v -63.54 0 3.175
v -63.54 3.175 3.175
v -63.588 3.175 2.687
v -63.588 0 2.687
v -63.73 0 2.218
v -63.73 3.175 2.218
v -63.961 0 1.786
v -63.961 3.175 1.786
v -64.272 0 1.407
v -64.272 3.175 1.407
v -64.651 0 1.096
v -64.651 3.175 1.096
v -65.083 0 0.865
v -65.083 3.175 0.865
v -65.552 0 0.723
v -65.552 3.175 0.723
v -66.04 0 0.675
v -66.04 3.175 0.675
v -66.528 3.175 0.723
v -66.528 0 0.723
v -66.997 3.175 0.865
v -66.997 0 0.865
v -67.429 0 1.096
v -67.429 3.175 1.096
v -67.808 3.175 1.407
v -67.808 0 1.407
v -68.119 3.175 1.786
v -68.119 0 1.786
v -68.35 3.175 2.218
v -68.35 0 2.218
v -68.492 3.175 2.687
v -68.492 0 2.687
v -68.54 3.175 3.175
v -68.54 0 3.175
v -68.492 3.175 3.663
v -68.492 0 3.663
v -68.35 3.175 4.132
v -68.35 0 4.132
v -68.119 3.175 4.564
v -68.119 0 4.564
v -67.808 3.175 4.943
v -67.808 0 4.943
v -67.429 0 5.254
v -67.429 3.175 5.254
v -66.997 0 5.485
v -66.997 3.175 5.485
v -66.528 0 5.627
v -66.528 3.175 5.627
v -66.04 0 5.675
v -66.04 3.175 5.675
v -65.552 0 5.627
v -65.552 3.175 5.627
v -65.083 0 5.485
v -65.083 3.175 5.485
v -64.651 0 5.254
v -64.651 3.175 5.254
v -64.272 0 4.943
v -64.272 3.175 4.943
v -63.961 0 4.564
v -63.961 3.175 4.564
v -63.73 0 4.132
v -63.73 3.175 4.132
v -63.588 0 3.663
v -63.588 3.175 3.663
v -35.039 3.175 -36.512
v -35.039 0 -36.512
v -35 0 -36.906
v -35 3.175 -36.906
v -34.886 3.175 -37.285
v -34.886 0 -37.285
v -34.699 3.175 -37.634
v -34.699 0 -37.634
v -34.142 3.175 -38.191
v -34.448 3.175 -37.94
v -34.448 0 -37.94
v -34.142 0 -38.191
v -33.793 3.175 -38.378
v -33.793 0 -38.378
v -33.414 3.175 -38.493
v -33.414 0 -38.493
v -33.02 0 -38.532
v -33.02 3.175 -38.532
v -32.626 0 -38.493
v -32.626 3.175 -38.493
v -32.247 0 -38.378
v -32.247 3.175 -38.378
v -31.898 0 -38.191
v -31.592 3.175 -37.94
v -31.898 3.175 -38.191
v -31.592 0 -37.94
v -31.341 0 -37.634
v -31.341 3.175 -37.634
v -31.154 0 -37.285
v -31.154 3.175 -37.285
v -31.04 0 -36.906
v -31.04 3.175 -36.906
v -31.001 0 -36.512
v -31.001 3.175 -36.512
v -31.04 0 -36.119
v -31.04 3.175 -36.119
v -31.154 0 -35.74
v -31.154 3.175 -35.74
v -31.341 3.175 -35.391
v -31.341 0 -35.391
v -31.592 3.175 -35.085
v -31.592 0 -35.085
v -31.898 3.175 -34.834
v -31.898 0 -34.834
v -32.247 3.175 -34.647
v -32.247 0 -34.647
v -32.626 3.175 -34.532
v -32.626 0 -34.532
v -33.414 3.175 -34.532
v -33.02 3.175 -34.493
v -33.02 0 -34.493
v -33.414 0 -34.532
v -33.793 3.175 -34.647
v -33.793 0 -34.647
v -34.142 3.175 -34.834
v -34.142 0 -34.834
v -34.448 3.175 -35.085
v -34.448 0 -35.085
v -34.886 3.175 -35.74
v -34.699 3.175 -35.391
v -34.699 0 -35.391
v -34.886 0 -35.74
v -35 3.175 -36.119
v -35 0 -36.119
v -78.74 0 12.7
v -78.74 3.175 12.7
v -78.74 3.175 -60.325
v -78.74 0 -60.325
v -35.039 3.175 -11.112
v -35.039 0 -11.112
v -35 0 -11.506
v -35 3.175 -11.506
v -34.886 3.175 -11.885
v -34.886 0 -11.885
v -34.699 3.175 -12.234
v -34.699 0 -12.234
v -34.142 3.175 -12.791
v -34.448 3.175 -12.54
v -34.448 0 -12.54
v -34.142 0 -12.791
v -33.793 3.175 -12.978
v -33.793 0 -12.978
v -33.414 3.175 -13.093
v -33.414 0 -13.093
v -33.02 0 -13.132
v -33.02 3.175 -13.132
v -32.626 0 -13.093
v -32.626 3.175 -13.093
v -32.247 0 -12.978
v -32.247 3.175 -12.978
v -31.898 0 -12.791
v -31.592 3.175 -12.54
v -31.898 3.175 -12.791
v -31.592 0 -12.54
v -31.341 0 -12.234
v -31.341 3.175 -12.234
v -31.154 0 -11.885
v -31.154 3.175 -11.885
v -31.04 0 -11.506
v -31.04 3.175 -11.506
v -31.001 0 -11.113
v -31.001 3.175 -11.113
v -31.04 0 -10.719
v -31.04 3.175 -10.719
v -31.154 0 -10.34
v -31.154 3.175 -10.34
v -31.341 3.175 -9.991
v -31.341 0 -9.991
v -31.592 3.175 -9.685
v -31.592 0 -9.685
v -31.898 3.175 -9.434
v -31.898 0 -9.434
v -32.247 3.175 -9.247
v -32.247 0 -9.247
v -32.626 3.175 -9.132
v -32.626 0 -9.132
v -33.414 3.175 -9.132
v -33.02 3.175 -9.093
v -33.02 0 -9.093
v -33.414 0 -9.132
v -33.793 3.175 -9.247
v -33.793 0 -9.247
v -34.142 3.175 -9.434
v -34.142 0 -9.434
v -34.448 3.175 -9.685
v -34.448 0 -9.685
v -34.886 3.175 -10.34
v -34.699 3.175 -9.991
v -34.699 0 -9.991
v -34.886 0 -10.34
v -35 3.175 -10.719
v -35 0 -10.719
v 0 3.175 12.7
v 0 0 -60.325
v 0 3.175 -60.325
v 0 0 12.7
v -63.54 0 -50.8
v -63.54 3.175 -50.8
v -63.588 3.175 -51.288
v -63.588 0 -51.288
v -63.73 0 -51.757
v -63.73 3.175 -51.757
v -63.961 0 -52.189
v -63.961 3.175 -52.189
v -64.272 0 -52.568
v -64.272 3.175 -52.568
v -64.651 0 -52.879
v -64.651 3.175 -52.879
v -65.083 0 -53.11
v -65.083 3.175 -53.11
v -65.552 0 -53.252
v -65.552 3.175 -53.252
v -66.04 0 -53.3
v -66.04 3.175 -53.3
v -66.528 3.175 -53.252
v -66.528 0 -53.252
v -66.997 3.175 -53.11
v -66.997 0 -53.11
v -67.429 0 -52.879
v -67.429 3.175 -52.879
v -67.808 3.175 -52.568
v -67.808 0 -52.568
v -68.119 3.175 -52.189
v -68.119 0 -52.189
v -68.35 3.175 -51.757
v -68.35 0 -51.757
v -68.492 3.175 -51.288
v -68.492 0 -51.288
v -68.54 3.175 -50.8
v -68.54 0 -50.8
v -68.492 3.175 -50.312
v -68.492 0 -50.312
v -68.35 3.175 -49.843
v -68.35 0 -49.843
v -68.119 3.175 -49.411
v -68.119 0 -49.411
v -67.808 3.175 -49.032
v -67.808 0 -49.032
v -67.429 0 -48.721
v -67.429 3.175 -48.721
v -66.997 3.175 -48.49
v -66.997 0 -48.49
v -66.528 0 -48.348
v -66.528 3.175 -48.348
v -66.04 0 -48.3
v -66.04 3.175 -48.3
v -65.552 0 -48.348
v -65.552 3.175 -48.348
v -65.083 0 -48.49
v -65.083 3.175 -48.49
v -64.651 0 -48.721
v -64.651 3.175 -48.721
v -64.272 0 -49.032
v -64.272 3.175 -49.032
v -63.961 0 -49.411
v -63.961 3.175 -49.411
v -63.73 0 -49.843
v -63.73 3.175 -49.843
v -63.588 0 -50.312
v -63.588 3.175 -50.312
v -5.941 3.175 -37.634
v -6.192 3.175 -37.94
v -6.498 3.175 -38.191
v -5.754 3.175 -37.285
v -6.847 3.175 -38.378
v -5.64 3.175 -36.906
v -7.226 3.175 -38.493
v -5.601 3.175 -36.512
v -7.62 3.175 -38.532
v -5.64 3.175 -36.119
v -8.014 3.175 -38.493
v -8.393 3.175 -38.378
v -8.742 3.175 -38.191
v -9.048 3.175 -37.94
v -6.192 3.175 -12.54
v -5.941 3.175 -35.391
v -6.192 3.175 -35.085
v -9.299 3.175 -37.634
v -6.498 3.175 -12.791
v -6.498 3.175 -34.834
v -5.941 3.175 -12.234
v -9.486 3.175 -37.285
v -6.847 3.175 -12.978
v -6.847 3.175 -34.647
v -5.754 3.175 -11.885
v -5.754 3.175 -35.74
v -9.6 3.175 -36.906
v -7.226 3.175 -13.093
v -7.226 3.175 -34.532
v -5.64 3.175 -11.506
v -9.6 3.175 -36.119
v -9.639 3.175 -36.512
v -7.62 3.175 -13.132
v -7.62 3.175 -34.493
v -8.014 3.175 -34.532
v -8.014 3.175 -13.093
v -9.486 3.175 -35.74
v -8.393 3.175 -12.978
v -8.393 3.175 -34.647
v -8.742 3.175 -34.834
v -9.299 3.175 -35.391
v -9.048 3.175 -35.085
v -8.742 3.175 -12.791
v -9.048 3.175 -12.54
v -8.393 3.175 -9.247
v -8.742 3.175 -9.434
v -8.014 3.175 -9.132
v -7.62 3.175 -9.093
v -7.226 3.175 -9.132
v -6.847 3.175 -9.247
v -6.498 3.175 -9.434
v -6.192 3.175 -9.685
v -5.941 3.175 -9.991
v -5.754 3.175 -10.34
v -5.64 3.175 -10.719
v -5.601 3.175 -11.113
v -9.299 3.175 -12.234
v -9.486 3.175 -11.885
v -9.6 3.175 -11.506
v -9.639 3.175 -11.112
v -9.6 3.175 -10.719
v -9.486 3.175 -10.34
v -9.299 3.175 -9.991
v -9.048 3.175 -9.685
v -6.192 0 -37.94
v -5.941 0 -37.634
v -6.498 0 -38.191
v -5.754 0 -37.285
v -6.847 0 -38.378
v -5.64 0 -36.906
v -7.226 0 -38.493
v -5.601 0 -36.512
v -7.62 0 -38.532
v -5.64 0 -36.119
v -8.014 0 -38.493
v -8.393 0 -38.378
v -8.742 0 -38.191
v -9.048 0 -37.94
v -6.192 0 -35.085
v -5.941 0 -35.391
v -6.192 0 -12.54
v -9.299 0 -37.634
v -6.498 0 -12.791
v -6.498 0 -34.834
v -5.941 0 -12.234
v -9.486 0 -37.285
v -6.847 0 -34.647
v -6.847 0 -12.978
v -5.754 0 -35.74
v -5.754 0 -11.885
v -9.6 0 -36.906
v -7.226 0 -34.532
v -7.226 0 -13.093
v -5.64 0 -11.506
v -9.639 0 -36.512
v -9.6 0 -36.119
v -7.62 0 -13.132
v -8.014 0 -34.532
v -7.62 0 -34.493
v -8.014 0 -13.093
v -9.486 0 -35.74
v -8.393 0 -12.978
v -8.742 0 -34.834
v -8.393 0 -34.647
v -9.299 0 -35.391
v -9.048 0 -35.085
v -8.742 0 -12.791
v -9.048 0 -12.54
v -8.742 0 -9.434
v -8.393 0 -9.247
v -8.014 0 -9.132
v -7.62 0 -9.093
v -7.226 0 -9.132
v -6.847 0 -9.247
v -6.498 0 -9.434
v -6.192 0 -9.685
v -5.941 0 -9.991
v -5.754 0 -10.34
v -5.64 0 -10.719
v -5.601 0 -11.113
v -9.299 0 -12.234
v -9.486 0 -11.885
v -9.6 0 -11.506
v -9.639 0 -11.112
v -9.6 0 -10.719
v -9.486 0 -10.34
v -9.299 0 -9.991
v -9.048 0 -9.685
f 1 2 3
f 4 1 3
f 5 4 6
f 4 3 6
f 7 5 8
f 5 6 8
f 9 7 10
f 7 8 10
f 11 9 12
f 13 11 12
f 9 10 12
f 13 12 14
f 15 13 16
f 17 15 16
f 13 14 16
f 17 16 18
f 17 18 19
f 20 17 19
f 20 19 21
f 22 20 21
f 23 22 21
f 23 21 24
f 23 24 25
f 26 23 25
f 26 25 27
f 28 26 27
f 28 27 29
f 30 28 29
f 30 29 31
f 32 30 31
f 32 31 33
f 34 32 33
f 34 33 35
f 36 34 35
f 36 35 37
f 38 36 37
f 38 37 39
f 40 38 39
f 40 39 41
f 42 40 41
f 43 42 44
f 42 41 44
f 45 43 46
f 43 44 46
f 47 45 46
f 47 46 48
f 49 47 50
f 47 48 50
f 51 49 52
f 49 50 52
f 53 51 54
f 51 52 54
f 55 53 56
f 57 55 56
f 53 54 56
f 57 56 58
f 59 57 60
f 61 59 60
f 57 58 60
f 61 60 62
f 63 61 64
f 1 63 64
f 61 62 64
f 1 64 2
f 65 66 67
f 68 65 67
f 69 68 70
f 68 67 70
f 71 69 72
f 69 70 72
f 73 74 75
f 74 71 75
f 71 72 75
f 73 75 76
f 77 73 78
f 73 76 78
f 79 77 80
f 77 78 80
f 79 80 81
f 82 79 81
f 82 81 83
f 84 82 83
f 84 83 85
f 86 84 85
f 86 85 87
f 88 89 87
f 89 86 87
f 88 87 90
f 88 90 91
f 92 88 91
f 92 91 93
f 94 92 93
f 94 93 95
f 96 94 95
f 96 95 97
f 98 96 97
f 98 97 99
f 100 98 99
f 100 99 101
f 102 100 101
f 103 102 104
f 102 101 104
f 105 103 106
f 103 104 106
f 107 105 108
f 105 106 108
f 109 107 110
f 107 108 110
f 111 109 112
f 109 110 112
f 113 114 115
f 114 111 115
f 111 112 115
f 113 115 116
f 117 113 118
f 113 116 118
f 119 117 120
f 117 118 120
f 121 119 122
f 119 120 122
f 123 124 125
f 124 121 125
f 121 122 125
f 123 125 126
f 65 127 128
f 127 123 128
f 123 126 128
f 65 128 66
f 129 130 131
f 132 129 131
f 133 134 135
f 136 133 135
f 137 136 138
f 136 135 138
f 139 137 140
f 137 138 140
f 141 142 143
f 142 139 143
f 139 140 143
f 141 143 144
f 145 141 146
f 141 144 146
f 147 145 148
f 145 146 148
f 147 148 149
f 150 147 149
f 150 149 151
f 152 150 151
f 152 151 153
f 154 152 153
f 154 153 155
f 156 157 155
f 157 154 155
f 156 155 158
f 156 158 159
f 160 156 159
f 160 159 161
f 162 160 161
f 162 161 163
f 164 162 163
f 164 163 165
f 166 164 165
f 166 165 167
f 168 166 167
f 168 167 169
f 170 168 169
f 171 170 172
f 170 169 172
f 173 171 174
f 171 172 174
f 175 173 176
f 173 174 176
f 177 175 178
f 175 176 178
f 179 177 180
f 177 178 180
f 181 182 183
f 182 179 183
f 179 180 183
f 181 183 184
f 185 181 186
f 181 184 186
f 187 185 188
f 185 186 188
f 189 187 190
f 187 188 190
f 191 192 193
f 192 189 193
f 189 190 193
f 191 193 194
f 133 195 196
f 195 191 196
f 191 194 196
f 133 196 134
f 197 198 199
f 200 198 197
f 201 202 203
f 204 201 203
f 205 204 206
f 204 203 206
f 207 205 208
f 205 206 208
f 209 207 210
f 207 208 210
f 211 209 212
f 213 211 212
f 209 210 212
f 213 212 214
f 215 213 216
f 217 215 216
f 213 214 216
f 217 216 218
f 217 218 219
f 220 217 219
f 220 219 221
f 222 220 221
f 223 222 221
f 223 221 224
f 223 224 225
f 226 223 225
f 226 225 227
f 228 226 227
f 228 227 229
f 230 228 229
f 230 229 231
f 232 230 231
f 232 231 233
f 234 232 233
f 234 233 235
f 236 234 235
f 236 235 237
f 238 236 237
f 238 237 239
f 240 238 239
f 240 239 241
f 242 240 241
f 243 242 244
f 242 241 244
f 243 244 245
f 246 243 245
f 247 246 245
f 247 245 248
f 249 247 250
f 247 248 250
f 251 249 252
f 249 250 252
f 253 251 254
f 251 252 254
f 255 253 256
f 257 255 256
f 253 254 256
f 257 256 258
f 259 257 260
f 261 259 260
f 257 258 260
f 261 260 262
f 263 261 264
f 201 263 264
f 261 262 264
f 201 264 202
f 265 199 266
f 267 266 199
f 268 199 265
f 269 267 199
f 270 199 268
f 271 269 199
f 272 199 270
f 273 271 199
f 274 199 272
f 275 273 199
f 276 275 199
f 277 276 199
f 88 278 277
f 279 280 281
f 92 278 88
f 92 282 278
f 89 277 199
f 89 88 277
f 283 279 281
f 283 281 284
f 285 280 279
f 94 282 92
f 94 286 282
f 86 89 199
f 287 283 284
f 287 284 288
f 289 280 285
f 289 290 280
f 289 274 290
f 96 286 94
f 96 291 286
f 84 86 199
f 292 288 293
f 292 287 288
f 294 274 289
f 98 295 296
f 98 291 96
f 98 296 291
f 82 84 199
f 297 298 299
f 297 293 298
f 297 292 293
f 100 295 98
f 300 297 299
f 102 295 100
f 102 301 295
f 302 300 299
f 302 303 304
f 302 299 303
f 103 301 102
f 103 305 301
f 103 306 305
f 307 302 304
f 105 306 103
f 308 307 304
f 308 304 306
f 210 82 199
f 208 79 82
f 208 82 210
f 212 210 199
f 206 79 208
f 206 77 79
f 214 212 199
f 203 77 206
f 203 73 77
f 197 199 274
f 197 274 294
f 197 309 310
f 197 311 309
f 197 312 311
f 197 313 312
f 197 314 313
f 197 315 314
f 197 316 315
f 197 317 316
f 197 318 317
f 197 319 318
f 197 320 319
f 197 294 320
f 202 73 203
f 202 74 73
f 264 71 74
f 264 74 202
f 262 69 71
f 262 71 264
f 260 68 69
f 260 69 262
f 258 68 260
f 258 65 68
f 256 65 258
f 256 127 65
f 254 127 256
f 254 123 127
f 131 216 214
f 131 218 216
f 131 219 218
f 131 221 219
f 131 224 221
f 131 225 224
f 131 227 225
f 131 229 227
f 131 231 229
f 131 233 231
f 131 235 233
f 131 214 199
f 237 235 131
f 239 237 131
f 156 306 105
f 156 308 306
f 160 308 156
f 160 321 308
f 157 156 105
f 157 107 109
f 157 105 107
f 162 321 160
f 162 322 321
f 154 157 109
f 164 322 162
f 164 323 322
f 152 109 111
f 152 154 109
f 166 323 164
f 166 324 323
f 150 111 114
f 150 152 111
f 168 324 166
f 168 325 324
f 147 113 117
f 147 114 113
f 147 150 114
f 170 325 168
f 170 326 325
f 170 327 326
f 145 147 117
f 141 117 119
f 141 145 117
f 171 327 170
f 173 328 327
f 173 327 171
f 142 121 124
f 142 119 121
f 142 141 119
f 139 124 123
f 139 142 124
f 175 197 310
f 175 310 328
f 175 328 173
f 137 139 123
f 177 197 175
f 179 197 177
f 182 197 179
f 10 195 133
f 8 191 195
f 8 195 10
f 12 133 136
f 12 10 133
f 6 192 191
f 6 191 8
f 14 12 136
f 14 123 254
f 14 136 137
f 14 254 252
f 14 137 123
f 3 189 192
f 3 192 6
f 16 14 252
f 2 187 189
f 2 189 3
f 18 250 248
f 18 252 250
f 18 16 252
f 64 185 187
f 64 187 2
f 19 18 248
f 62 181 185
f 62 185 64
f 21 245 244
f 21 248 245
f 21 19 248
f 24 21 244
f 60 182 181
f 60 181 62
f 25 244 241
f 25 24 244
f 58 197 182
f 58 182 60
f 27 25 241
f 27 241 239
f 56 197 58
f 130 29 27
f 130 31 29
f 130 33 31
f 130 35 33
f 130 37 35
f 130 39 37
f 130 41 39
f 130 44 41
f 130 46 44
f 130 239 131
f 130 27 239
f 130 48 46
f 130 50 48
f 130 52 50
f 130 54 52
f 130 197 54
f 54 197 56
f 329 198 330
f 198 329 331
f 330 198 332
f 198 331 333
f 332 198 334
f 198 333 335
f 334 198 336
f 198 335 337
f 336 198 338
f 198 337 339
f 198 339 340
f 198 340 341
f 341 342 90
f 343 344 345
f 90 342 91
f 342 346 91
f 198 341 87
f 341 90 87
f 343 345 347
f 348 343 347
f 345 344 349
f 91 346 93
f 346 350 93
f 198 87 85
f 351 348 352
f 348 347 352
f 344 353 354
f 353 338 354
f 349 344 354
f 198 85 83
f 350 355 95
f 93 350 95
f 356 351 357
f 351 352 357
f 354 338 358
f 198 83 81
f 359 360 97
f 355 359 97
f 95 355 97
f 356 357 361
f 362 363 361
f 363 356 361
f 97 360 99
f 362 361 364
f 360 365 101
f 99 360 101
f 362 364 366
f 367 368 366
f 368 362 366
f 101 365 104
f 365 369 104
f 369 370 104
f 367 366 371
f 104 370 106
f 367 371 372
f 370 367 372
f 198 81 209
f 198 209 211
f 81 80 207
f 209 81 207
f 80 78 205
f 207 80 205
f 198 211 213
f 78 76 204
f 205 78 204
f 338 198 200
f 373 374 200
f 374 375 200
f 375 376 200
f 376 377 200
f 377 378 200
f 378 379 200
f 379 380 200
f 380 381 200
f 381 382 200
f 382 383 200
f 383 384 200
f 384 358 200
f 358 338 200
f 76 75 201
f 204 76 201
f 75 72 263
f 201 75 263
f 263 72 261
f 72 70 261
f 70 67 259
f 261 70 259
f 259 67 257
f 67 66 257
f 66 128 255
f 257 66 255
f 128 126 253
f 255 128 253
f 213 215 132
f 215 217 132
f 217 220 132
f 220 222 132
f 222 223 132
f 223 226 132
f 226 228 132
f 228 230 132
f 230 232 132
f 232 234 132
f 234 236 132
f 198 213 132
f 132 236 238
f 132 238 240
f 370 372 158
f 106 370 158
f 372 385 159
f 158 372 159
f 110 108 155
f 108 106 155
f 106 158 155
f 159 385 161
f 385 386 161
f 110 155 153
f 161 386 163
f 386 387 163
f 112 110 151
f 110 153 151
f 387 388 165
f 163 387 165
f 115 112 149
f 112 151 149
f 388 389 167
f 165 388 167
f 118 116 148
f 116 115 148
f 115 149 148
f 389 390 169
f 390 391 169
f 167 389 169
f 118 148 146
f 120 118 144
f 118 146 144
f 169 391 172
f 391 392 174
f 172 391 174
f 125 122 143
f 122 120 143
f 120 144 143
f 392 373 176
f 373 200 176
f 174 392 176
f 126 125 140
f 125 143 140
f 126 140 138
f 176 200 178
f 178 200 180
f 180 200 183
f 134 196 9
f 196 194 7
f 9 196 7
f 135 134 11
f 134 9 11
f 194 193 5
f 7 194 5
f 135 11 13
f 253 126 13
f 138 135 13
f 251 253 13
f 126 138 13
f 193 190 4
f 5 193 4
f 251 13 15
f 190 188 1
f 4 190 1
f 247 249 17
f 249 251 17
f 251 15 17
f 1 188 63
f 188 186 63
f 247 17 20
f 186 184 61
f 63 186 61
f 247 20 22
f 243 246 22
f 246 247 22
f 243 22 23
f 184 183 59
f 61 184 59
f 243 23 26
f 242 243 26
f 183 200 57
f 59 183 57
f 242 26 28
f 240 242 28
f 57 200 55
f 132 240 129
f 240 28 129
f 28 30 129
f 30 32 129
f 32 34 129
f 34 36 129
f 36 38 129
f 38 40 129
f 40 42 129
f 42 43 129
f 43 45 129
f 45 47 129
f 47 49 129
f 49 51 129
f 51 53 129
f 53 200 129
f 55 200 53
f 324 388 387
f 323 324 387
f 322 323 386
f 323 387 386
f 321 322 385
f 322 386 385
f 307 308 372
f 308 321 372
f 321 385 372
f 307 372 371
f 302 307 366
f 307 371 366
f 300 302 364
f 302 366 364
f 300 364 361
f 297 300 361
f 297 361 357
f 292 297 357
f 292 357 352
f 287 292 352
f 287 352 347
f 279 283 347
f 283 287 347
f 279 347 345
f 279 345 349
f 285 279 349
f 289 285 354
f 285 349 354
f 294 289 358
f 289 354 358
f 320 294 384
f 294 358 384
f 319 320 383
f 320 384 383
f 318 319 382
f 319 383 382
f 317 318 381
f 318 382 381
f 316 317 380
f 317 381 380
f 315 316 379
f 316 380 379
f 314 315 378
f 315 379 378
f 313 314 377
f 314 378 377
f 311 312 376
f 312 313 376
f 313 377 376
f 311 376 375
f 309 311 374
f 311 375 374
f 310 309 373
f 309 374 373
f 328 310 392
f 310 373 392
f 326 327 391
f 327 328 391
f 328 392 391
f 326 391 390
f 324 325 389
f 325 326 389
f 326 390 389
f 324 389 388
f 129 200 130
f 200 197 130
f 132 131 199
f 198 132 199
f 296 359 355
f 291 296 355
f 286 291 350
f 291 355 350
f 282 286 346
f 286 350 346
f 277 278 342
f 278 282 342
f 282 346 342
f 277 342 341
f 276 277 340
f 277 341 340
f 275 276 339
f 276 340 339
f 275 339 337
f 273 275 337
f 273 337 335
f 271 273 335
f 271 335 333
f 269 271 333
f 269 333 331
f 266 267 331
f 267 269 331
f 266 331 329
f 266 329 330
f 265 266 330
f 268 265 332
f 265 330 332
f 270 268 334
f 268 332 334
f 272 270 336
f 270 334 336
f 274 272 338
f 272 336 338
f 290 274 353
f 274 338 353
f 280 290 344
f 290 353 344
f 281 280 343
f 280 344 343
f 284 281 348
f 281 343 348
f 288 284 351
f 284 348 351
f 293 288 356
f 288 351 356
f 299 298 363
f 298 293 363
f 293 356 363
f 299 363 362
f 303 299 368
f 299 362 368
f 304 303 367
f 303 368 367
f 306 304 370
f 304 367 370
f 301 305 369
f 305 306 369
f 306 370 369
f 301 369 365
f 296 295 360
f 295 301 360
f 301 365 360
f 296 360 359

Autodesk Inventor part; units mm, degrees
ref_plane "YZ Plane" through (0, 0, 0) normal (1, 0, 0) x (0, 1, 0)
ref_plane "XZ Plane" through (0, 0, 0) normal (0, 1, 0) x (-1, 0, 0)
ref_plane "XY Plane" through (0, 0, 0) normal (0, 0, 1) x (1, 0, 0)
sketch "Sketch1" plane through (0, 0, 0) normal (0, 1, 0) x (-1, 0, 0)
  line L0 (0, 0) -> (101.6, 0)
  line L1 (101.6, 0) -> (101.6, -47.625)
  line L2 (101.6, -47.625) -> (0, -47.625)
  line L3 (0, -47.625) -> (0, 0)
  circle A0 centre (88.9, -9.525) radius 2.5
  circle A1 centre (88.9, -38.1) radius 2.5
  circle A2 centre (7.62, -11.1125) radius 2.0193
  circle A3 centre (33.02, -11.1125) radius 2.0193
  circle A4 centre (33.02, -36.5125) radius 2.0193
  circle A5 centre (7.62, -36.5125) radius 2.0193
  line L4 (0, 0) -> (0, -40.7836)
  point P0 (37.1991, -51.2989)
  point P1 (24.9809, -31.7225)
  point P2 (38.4109, -31.7225)
  dimension "d0" = 101.6
  dimension "d1" = 47.625
  dimension "d2" = 5
  dimension "d3" = 5
  dimension "d4" = 12.7
  dimension "d5" = 12.7
  dimension "d6" = 9.525
  dimension "d7" = 9.525
  dimension "d8" = 25.4
  dimension "d9" = 25.4
  dimension "d10" = 25.4
  dimension "d11" = 25.4
  dimension "d12" = 4.0386
  dimension "d13" = 4.0386
  dimension "d14" = 4.0386
  dimension "d15" = 4.0386
  dimension "d16" = 11.1125
extrude "Extrusion1" add sketch "Sketch1" along normal blind 3.175
sketch "Sketch2" plane through (0, 3.175, 0) normal (0, 1, 0) x (1, 0, 0)
  line L0 (-101.6, 47.625) -> (-101.6, 0) projected
  line L1 (-101.6, 0) -> (0, 0) projected
  line L2 (0, 0) -> (0, 47.625) projected
  line L3 (0, 47.625) -> (-101.6, 47.625) projected
  circle A0 centre (-88.9, 9.525) radius 2.5 projected
  circle A1 centre (-88.9, 38.1) radius 2.5 projected
  circle A2 centre (-7.62, 11.1125) radius 2.0193 projected
  circle A3 centre (-33.02, 11.1125) radius 2.0193 projected
  circle A4 centre (-33.02, 36.5125) radius 2.0193 projected
  circle A5 centre (-7.62, 36.5125) radius 2.0193 projected
  line L4 (-78.74, 0) -> (-78.74, 47.625)
  line L5 (0, 47.625) -> (-101.6, 47.625) projected
  line L6 (0, -12.7) -> (-78.74, -12.7)
  line L7 (-78.74, -12.7) -> (-78.74, 60.325)
  line L8 (-78.74, 60.325) -> (0, 60.325)
  line L9 (0, 60.325) -> (0, -12.7)
  circle A6 centre (-66.04, -3.175) radius 2.5
  circle A7 centre (-66.04, 50.8) radius 2.5
  dimension "d19" = 78.74
  dimension "d20" = 9.525
  dimension "d21" = 12.7
  dimension "d22" = 12.7
  dimension "d23" = 9.525
  dimension "d24" = 12.7
  dimension "d25" = 12.7
extrude "Extrusion2" add sketch "Sketch2" against normal blind 3.175 contours L7 L8 L9 L3 | L3 L2 L1 L4 | L1 L9 L6 L7
extrude "Extrusion3" cut sketch "Sketch2" against normal through all contours L3 L4 L1 L0
equation "\"d5\" = d4"
equation "\"d6\" = 0.2 * d1"
equation "\"d7\" = d6"
equation "\"d20\" = d7"
equation "\"d21\" = d5"
equation "\"d23\" = d20"
equation "\"d25\" = d24"
properties part number "MotorMount" material "Aluminum 6061"
